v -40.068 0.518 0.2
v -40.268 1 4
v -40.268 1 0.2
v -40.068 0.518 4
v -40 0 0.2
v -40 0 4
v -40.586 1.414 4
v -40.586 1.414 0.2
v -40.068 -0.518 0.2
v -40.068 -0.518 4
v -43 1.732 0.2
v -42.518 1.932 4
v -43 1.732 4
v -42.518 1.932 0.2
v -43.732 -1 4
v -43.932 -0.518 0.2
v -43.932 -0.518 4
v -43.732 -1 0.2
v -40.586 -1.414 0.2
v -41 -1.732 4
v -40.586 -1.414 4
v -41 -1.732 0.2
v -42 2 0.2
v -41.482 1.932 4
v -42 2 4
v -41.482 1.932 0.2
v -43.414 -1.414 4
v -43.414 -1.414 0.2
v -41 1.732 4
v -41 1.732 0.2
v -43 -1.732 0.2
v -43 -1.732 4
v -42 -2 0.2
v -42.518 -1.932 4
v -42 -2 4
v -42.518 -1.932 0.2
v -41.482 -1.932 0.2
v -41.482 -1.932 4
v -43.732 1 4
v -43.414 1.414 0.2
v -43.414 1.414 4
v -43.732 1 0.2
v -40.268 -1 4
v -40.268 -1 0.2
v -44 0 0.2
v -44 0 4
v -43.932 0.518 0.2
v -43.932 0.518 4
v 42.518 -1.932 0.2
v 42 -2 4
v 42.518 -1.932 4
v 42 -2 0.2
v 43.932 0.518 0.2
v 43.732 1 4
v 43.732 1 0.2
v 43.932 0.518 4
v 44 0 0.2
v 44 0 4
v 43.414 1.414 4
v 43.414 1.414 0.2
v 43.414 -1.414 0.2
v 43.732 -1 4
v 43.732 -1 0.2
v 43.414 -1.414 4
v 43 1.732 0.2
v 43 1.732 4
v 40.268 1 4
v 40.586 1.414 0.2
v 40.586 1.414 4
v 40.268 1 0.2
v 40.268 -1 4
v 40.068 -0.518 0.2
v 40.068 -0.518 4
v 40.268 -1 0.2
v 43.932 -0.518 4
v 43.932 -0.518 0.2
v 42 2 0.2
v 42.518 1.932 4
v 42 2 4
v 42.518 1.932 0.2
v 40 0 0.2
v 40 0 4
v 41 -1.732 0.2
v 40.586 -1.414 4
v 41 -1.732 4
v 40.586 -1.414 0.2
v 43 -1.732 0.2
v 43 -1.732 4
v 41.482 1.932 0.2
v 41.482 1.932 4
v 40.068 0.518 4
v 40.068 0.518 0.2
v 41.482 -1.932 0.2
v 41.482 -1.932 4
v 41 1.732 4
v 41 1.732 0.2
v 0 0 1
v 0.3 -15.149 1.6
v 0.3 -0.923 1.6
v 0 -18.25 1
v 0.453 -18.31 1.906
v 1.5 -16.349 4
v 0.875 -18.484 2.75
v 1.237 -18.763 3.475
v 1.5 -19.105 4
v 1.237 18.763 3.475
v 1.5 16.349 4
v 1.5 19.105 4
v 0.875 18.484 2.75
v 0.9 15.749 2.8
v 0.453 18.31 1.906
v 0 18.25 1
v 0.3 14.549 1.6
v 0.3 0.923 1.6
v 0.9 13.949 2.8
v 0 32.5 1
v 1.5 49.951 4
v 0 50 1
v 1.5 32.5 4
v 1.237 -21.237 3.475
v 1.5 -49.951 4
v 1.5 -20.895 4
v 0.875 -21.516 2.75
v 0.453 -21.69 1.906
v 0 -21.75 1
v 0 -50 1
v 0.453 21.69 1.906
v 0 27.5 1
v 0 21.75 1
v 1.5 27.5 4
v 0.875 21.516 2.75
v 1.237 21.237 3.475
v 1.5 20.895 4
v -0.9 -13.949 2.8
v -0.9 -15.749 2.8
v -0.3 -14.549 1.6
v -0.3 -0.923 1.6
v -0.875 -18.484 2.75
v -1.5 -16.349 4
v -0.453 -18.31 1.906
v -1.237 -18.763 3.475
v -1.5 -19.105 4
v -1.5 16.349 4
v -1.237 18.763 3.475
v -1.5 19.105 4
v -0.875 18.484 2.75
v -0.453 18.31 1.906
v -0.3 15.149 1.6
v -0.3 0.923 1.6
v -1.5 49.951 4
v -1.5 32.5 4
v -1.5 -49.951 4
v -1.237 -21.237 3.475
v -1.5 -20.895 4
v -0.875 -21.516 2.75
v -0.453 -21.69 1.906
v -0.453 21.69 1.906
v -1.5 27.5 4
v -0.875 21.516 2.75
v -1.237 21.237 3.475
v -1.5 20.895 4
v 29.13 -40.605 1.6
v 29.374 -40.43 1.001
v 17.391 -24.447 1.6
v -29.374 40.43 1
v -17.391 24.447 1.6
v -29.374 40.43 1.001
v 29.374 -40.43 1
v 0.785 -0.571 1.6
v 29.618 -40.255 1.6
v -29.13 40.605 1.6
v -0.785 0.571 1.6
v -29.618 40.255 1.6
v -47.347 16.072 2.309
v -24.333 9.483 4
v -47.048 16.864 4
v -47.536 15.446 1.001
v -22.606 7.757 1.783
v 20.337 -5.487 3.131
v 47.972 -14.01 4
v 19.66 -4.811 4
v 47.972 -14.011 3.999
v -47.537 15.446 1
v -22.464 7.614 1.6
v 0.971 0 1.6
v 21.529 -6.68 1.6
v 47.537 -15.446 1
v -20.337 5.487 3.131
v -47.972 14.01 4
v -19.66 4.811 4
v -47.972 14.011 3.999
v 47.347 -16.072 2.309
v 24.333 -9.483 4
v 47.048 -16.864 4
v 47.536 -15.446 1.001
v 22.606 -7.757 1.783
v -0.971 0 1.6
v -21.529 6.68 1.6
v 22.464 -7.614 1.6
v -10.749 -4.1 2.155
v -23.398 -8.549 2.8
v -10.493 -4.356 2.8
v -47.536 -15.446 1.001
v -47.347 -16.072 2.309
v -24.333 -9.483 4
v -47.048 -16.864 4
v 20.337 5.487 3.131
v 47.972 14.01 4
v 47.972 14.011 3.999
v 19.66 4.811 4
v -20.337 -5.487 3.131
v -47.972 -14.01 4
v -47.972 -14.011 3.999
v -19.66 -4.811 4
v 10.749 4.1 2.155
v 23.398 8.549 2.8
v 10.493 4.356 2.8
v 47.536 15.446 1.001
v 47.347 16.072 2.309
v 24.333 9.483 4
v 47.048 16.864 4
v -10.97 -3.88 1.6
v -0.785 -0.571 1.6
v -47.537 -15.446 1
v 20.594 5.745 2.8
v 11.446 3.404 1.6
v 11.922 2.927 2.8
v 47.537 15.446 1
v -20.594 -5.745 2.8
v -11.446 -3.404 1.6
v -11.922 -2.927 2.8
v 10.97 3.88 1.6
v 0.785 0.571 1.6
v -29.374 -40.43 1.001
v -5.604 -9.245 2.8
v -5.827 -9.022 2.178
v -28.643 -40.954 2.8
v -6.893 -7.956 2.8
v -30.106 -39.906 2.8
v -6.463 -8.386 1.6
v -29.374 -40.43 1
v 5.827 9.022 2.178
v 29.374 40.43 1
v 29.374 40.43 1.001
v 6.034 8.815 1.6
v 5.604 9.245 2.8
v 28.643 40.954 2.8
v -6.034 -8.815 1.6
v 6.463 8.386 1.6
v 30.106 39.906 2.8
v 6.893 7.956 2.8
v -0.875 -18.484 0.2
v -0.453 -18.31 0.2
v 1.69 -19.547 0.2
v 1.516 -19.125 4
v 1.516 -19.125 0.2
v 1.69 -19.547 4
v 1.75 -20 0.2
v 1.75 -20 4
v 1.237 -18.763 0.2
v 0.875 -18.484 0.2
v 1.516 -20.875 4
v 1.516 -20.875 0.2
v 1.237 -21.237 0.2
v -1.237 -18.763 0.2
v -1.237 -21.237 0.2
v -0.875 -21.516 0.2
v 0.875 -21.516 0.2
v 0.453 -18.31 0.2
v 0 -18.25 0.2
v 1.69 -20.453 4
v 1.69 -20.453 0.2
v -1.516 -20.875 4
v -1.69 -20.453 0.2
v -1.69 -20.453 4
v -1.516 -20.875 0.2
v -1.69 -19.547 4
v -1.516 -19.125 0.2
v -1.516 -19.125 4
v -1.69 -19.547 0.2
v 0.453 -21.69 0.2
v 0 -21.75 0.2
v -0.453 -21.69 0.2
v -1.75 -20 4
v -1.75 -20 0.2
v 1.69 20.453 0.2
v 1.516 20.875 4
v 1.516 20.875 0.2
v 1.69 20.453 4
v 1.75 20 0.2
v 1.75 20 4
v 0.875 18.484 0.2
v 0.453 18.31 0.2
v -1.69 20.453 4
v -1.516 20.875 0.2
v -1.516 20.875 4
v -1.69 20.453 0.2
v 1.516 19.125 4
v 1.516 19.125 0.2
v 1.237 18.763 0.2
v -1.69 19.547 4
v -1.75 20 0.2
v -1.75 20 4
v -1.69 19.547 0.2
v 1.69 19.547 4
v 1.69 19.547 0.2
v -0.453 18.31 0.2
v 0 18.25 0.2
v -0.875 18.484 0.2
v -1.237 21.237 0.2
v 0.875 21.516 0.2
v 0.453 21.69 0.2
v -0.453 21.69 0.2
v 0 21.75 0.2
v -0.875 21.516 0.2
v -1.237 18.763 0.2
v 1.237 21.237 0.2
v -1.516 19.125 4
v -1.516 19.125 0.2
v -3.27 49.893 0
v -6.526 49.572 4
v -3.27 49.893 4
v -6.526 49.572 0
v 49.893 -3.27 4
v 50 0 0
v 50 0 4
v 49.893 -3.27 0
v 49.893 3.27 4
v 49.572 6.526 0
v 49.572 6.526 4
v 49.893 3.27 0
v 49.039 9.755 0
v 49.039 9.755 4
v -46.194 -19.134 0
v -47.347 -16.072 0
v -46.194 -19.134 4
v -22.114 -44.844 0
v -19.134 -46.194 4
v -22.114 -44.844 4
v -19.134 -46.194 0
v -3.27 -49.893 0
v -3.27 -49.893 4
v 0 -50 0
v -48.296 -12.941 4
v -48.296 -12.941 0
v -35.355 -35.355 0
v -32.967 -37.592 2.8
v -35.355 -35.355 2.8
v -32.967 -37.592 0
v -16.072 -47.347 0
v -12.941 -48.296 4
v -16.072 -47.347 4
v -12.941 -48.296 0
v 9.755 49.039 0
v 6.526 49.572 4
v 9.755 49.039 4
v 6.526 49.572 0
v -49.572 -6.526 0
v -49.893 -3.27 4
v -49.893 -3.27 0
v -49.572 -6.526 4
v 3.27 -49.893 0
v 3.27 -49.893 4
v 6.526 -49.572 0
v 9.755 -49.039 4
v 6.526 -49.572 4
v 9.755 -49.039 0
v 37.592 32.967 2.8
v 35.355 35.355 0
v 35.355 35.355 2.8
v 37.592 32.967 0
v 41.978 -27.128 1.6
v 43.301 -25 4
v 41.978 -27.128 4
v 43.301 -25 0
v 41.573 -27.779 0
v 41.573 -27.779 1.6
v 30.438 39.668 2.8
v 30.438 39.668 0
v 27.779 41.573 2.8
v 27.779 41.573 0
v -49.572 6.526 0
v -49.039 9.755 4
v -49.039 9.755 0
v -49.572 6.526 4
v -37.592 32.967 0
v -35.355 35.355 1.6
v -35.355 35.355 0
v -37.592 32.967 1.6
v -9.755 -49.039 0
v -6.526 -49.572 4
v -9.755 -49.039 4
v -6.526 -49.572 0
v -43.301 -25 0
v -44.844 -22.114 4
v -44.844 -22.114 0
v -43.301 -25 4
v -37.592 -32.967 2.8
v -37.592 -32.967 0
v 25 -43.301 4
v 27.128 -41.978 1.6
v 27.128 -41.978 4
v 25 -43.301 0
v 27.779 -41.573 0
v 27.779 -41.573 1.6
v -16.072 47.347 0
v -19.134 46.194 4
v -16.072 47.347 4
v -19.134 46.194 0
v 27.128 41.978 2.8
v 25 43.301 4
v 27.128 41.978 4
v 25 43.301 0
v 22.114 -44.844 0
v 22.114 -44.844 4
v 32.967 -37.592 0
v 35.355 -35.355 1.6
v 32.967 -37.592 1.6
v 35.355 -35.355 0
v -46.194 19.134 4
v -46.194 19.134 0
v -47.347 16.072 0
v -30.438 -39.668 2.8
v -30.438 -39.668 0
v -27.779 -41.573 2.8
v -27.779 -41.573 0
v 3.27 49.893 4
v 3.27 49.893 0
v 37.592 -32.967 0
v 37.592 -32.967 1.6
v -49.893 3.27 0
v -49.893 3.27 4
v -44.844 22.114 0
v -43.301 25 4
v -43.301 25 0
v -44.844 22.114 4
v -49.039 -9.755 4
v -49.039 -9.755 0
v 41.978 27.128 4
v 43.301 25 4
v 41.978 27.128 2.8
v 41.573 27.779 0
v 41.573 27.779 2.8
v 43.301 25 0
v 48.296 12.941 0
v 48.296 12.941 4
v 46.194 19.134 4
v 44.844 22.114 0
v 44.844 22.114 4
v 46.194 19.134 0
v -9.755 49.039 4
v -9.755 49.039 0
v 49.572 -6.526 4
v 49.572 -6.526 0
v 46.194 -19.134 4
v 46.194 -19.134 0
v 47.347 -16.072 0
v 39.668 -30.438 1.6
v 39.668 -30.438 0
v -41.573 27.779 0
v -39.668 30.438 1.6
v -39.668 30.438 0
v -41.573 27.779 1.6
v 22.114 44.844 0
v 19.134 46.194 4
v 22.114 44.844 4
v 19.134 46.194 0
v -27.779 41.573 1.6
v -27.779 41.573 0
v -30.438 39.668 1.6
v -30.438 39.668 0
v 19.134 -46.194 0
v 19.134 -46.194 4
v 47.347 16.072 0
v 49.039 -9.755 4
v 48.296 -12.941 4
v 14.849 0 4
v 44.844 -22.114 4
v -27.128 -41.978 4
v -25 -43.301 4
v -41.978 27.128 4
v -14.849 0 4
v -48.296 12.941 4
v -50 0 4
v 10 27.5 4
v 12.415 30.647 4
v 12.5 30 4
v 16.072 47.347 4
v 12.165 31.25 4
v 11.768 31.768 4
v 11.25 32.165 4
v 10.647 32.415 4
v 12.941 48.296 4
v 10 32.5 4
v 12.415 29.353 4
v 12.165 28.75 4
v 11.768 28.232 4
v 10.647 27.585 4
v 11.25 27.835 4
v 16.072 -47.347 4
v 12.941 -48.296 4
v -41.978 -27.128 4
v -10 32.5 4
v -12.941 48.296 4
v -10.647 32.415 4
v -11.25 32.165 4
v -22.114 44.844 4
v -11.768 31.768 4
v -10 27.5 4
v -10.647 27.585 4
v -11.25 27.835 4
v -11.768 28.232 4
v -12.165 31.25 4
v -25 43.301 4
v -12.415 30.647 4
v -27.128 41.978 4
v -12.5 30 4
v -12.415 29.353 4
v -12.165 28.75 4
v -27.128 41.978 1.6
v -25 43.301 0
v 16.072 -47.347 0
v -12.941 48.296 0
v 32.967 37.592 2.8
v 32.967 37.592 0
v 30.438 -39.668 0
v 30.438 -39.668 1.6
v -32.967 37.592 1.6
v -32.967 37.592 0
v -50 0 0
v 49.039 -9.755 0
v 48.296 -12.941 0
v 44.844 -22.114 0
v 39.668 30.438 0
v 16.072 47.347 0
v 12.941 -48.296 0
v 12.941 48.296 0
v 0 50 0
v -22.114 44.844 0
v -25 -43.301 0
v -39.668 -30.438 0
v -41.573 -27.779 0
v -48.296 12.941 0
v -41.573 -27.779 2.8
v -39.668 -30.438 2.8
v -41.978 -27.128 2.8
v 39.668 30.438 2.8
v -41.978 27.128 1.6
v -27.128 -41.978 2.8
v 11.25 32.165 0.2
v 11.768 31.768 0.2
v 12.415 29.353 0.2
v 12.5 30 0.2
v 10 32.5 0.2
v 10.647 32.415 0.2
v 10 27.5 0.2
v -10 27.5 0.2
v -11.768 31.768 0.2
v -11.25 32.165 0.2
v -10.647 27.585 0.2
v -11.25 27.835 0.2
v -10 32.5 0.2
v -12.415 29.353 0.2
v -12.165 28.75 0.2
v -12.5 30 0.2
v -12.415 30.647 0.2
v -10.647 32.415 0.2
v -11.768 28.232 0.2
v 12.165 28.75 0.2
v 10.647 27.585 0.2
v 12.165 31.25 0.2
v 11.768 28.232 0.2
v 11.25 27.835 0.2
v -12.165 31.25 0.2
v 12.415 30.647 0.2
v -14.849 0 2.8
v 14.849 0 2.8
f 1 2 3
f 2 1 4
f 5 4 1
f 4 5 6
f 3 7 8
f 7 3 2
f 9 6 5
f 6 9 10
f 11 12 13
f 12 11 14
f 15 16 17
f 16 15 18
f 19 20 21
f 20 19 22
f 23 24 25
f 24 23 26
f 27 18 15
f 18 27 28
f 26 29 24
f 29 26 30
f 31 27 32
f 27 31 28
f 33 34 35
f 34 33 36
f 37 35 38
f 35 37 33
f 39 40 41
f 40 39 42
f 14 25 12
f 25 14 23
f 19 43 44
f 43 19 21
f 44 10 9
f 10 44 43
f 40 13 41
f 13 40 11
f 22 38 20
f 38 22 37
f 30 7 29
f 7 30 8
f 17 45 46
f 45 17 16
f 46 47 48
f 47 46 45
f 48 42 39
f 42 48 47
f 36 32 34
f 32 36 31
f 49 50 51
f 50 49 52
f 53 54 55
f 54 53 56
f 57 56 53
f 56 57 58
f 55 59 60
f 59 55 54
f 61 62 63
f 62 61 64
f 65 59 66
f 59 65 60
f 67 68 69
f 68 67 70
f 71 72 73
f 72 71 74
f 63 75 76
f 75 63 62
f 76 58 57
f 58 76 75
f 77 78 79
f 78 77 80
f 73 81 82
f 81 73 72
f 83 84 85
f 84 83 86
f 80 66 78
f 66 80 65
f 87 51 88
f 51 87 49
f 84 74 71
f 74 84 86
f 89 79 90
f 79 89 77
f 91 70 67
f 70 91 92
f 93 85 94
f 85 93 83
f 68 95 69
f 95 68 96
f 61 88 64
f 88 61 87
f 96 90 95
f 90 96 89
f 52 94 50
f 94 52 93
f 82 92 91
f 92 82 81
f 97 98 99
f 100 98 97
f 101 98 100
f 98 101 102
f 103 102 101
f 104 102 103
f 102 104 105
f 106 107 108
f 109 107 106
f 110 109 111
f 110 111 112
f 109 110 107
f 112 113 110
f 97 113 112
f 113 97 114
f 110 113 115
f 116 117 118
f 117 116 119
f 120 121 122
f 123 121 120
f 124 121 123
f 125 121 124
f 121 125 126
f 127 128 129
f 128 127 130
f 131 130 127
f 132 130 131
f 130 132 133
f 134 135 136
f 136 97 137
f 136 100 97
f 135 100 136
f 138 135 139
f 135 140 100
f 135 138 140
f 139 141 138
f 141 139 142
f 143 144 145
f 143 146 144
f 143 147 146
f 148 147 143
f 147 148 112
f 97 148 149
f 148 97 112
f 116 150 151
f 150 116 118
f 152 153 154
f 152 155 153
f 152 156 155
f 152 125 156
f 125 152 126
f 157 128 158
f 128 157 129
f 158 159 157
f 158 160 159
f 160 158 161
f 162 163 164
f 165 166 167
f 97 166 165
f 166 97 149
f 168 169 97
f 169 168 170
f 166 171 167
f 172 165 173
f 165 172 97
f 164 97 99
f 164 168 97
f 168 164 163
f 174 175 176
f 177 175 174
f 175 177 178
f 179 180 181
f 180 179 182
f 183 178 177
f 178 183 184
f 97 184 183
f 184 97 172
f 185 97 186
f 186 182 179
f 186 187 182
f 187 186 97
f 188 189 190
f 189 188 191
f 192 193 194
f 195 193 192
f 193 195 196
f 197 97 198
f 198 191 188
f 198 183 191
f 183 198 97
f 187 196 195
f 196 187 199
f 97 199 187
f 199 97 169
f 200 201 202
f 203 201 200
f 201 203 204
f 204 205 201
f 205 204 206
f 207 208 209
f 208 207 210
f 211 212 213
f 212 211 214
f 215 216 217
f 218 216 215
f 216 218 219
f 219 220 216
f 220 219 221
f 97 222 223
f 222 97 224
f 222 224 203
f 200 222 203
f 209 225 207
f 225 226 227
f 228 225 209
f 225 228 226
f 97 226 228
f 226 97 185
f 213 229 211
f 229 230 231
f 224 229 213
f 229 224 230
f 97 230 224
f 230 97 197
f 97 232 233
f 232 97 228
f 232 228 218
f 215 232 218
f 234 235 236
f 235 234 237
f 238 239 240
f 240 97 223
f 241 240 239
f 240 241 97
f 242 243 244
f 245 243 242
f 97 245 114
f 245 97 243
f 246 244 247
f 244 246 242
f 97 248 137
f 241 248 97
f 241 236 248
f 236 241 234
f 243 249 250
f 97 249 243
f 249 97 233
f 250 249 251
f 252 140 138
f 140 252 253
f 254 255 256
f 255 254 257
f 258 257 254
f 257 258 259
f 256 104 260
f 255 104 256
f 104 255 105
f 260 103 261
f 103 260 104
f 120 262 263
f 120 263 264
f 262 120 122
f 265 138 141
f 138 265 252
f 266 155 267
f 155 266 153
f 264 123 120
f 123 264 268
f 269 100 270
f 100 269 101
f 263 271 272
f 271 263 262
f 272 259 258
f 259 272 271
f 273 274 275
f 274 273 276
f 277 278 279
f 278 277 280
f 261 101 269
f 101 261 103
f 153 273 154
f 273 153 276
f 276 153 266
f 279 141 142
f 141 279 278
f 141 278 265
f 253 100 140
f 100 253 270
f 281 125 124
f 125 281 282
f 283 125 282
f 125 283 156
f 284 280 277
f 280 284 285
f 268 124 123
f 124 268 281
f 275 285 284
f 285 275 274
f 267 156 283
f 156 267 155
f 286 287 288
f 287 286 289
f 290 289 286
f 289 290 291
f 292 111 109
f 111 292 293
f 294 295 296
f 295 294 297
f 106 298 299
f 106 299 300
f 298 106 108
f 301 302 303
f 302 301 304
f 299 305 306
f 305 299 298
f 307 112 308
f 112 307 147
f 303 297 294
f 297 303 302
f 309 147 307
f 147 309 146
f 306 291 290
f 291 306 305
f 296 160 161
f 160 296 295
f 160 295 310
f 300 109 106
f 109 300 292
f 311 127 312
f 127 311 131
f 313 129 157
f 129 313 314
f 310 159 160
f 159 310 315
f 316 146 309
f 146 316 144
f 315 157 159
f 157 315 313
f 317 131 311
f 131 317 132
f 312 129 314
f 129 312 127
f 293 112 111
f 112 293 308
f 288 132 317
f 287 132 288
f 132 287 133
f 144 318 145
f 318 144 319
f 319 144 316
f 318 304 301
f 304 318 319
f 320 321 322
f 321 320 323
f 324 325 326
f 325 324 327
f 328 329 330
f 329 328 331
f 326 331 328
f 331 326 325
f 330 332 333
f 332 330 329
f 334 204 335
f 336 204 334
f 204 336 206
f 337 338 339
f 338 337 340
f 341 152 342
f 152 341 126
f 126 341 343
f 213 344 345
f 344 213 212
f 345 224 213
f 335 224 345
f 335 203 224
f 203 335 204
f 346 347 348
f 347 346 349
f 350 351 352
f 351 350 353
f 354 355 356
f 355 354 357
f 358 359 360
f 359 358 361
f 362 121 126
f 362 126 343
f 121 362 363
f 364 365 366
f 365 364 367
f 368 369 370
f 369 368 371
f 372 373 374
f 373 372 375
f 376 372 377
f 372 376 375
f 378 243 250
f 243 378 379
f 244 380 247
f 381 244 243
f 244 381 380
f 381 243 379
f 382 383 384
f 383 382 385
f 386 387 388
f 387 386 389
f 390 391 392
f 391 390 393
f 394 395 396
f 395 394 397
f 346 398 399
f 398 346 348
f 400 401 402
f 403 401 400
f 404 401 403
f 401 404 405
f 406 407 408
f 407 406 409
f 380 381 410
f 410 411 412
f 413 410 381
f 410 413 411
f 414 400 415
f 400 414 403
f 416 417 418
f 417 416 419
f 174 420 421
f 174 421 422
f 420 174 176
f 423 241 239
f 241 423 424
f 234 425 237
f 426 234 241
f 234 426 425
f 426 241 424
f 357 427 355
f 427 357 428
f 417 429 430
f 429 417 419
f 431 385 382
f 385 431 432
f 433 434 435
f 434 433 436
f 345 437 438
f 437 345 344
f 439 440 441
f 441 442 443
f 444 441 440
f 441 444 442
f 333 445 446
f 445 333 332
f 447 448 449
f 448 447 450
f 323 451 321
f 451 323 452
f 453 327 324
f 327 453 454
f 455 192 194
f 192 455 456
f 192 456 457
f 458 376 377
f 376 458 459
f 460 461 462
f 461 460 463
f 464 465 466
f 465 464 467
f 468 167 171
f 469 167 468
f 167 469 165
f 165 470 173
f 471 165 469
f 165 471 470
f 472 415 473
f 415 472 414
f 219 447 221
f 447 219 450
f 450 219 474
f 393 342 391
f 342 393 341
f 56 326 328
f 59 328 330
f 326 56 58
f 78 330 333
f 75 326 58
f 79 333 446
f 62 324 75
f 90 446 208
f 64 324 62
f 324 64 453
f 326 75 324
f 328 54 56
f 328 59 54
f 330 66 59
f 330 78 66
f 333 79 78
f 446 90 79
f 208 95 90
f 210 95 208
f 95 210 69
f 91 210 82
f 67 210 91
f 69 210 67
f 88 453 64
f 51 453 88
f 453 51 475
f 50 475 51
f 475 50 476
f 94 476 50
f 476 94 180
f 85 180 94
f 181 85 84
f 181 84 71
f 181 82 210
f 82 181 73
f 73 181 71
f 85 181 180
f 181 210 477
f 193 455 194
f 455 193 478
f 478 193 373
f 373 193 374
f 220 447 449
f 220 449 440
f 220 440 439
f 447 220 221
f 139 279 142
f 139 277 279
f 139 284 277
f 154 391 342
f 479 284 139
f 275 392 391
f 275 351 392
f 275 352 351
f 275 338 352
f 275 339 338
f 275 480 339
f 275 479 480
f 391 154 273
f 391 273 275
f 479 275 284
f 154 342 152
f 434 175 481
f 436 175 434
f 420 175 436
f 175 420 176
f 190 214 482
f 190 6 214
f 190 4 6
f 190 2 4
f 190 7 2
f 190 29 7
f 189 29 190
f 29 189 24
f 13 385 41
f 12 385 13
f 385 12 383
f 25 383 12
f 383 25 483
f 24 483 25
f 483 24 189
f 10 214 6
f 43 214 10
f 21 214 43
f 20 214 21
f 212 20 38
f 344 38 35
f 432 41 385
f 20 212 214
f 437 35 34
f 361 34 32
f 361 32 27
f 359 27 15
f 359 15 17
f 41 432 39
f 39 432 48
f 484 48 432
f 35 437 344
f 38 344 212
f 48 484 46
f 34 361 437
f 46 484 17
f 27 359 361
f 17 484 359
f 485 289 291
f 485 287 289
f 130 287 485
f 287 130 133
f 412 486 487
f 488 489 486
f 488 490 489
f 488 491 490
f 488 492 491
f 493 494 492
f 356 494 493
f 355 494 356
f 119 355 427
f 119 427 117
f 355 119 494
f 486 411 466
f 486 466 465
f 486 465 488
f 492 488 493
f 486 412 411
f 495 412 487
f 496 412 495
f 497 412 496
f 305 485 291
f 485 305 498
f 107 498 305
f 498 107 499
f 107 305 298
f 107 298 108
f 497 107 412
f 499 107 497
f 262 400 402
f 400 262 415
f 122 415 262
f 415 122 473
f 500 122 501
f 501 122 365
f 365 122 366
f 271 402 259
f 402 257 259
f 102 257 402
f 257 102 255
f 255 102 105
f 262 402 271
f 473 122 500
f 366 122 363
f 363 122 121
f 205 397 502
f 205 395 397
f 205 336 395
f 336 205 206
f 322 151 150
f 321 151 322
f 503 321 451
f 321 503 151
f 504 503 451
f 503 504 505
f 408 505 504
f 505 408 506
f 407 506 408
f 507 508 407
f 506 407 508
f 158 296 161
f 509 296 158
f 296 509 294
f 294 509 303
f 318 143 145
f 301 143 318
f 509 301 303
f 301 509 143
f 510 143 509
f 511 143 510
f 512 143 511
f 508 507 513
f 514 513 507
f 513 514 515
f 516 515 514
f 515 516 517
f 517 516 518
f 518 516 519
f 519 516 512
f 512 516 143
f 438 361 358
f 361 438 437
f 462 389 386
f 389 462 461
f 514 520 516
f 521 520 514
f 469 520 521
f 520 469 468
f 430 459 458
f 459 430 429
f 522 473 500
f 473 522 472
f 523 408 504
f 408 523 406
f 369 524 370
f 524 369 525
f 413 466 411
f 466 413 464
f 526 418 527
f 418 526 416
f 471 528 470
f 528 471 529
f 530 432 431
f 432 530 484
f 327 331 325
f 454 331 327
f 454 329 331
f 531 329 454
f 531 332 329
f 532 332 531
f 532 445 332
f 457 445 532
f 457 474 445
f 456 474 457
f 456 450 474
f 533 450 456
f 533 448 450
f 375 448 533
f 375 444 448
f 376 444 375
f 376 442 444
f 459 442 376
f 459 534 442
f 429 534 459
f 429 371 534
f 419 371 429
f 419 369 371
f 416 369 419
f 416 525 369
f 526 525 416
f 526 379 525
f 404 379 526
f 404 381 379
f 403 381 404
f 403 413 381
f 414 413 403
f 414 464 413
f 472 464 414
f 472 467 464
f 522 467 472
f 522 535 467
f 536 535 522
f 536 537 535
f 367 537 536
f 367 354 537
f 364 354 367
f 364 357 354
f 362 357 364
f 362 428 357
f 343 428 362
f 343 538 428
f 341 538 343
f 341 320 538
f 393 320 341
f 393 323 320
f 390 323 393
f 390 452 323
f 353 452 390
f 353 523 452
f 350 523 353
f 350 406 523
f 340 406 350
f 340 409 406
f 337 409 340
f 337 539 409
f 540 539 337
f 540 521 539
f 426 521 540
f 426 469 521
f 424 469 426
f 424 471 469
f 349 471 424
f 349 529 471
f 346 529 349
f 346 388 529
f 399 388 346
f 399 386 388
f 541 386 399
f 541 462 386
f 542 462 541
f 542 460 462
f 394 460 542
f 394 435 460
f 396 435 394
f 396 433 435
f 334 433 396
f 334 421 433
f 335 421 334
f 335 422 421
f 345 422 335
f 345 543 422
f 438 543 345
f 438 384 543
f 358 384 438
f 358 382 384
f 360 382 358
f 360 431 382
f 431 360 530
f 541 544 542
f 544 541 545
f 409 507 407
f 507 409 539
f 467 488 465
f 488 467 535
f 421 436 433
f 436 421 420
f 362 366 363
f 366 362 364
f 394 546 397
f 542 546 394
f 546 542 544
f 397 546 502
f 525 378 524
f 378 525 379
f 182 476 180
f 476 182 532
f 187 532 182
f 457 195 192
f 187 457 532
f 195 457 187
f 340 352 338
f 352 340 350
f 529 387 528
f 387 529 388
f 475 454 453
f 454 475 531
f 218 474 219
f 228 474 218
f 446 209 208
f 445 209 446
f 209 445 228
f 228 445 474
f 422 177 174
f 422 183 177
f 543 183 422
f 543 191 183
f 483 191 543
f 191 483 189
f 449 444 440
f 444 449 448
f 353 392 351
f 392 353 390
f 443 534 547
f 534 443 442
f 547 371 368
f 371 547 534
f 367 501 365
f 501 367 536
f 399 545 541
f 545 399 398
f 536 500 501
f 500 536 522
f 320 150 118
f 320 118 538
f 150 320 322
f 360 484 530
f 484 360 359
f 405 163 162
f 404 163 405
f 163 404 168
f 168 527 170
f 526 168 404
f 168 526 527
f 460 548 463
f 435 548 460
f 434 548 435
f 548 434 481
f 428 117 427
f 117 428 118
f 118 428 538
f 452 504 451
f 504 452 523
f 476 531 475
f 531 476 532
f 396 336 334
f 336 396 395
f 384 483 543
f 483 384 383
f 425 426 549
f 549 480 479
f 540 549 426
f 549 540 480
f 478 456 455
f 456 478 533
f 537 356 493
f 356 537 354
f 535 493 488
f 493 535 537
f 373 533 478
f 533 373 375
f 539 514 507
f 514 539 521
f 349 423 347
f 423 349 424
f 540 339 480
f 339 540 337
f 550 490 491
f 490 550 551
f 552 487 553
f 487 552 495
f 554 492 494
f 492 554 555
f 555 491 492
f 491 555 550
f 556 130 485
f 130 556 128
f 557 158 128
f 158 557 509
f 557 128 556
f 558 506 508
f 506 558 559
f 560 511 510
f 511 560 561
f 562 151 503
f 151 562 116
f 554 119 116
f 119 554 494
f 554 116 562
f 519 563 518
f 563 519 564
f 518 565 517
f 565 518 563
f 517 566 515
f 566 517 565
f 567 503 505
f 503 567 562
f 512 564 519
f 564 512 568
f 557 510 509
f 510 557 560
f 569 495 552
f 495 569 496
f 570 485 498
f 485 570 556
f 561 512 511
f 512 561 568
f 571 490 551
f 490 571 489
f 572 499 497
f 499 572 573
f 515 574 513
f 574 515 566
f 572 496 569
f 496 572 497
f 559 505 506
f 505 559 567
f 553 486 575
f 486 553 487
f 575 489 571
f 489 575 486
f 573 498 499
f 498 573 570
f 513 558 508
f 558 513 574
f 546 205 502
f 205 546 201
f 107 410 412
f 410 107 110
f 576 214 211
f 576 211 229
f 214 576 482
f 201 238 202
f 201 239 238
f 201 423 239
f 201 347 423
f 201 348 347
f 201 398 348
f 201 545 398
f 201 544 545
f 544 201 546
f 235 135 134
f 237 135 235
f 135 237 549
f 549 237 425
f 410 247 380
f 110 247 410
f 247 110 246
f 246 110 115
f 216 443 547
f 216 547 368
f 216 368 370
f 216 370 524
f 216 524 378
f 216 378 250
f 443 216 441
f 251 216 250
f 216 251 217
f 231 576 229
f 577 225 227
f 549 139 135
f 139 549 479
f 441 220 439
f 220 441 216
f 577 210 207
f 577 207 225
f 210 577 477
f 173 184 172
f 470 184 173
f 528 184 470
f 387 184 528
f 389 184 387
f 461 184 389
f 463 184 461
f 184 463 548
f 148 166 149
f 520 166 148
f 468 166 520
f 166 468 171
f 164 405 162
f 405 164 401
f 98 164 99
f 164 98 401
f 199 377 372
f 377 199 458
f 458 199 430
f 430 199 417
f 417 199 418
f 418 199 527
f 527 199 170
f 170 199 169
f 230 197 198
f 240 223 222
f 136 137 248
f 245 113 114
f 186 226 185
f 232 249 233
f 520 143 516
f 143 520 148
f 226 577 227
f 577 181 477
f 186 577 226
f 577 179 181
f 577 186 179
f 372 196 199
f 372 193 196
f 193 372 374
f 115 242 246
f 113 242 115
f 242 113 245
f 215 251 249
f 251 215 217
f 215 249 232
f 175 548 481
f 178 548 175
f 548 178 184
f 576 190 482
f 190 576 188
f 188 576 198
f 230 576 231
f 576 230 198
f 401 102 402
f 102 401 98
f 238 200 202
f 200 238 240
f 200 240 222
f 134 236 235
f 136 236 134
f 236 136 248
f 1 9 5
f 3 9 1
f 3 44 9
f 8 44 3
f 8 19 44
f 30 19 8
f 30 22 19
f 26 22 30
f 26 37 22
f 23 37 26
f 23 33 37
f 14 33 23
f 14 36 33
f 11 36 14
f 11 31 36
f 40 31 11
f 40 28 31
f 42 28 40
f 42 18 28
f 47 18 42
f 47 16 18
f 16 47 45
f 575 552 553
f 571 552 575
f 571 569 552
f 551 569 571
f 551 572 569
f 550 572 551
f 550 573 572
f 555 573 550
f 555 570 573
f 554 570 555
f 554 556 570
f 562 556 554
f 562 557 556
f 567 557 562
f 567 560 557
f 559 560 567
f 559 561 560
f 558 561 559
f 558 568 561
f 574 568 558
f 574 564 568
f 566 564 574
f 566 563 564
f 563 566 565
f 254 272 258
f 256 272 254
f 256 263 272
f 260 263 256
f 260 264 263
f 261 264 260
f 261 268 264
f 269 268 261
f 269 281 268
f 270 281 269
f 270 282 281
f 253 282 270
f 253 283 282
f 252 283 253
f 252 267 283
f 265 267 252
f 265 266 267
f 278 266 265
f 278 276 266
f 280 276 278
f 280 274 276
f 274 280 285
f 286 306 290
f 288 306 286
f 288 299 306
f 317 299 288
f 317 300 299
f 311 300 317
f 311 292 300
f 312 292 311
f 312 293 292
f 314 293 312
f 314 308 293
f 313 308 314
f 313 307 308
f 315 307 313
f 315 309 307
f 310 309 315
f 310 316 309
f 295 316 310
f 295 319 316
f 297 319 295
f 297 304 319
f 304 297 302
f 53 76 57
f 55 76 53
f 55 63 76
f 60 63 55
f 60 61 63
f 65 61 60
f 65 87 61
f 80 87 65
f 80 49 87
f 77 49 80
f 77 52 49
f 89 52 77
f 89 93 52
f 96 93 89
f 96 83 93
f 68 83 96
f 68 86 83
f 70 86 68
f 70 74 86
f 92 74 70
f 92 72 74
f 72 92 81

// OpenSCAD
// file: ../OpenSCAD_Modules/cube_vround.scad
module cube_vround(
	size=[10,10,10],
	round_corners=[true,true,true,true],
	rounding=3,
	center_xy=false,
	center_z=false,
	attach=0,
	wall_attach=0,
	quality=2, //integer from 1 to infinity
)
{
	assert(len(size)==3);
	assert(len(round_corners)==4);
	assert(rounding>0);
	assert(rounding<=size[0]/2);
	assert(rounding<=size[1]/2);
	assert(quality>0);
	assert(attach>=0);
	assert(wall_attach>=0);
	height=size[2]+attach;
	cyl_r=rounding+wall_attach;
	cyl_mvx=size[0]/2-rounding;
	cyl_mvy=size[1]/2-rounding;
	cube_szx=size[0]/2;
	cube_szy=size[1]/2;
	cube_mvx=cube_szx/2+wall_attach;
	cube_mvy=cube_szy/2+wall_attach;
	translate([center_xy?0:cube_szx,center_xy?0:cube_szy,center_z?-attach/2:(size[2]-attach)/2])
		hull()
		{
			if(round_corners[0])
				translate([cyl_mvx,cyl_mvy])
					cylinder(r=cyl_r,h=height,$fn=12*quality,center=true);
			else
				translate([cube_mvx,cube_mvy])
					cube([cube_szx,cube_szy,height],center=true);
			if(round_corners[1])
				translate([cyl_mvx,-cyl_mvy])
					cylinder(r=cyl_r,h=height,$fn=12*quality,center=true);
			else
				translate([cube_mvx,-cube_mvy])
					cube([cube_szx,cube_szy,height],center=true);
			if(round_corners[2])
				translate([-cyl_mvx,-cyl_mvy])
					cylinder(r=cyl_r,h=height,$fn=12*quality,center=true);
			else
				translate([-cube_mvx,-cube_mvy])
					cube([cube_szx,cube_szy,height],center=true);
			if(round_corners[3])
				translate([-cyl_mvx,cyl_mvy])
					cylinder(r=cyl_r,h=height,$fn=12*quality,center=true);
			else
				translate([-cube_mvx,cube_mvy])
					cube([cube_szx,cube_szy,height],center=true);
		};
}

//example
cube_vround(round_corners=[true,false,true,false],
size=[10,20,6],
attach=0.1,
wall_attach=0.1,
rounding=3,
center_xy=true,center_z=false);
// main file
use <../OpenSCAD_Modules/cube_vround.scad>

module HNut
(
	nutDiam=6.75,
	nutHeight=3,
)
{
	cylinder(d=nutDiam,h=nutHeight,center=false,$fn=6);
}

module Plate
(
	ext_diameter=100,
	base_height=4,
	pwr_wires_cut_size=[20,5,30],
	metal_bar_size=[21,1.2],
	metal_bar_clips=[5,5,85],
	clip_wires_cut_diam=4,
	stiffener_rays_count=5,
	stiffener_rays_size=[3,3,90],
	screw_diam=3.5,
	screw_diff=40,
	quality=2,
	stub_layer_size=0.2,
)
{
	cutClr=1;
	union()
	{
		difference()
		{
			//base
			cylinder(h=base_height,d=ext_diameter,center=false,$fn=48*quality);
			//wires_cut
			hull()
			{
				translate([-pwr_wires_cut_size[0]/2,pwr_wires_cut_size[2],-cutClr])
				cylinder(h=base_height+2*cutClr,d=pwr_wires_cut_size[1],center=false,$fn=12*quality);
				translate([pwr_wires_cut_size[0]/2,pwr_wires_cut_size[2],-cutClr])
				cylinder(h=base_height+2*cutClr,d=pwr_wires_cut_size[1],center=false,$fn=12*quality);
			}
			
			rotate(a=45, v=[0,0,1])
			translate([0,0,(metal_bar_size[1]+cutClr)/2+base_height-metal_bar_size[1]])
			{
				//metal bar top cut
				cube(size=[ext_diameter*2,metal_bar_size[0],metal_bar_size[1]+cutClr],center=true);
			}

			rotate(a=-45, v=[0,0,1])
			translate([0,0,(metal_bar_size[1]*2+cutClr)/2+base_height-metal_bar_size[1]*2])
			{
				//metal bar top cut
				cube(size=[ext_diameter*2,metal_bar_size[0],metal_bar_size[1]*2+cutClr],center=true);
			}

			//metal bar clip wires
			for(i=[-1,1])
			{
				translate([i*(metal_bar_clips[2]/2-metal_bar_clips[0]/2+clip_wires_cut_diam/2),0,-cutClr])
				cylinder(h=base_height+2*cutClr,d=clip_wires_cut_diam,center=false,$fn=12*quality);
			}
			//stiffener rays
			for(i=[0:1:stiffener_rays_count-1])
			{
				rotate(a=i*(180/stiffener_rays_count),v=[0,0,1])
				rotate(a=90,v=[1,0,0])
				linear_extrude(h=stiffener_rays_size[2],center=true)
				polygon(points=[
					[0,-stiffener_rays_size[1]+base_height],
					[-stiffener_rays_size[0]/2,base_height],
					[-stiffener_rays_size[0]/2,cutClr+base_height],
					[stiffener_rays_size[0]/2,cutClr+base_height],
					[stiffener_rays_size[0]/2,base_height],
				]);
			}
			//screw holes
			for(i=[-1,1])
			{
				translate([0,i*(screw_diff/2),-cutClr])
				cylinder(h=base_height+2*cutClr,d=screw_diam,center=false,$fn=12*quality);
			}
		}

		//stub layer
		cylinder(h=stub_layer_size,d=ext_diameter,center=false,$fn=48*quality);
	}
}

module TopClip
(
	ext_diameter=50,
	base_height=4,
	screw_diam=3.5,
	screw_diff=40,
	quality=2,
	stub_layer_size=0.2,
)
{
	cutClr=1;
	union()
	{
		difference()
		{
			//base
			cylinder(h=base_height,d=ext_diameter,center=false,$fn=48*quality);
			//screw holes
			for(i=[-1,1])
			{
				translate([0,i*(screw_diff/2),-cutClr])
				cylinder(h=base_height+2*cutClr,d=screw_diam,center=false,$fn=12*quality);
			}
		}
		//stub layer
		cylinder(h=stub_layer_size,d=ext_diameter,center=false,$fn=48*quality);
	}
}

module BackPlate
(
	backplate_size=[85,45],
	center_cut_size=[18,2],
	rounding=2,
	base_height=5,
	screw_diam=3.5,
	screw_diff=40,
	nut_height=2,
	side_screw_diam=3,
	side_screw_pos=[80,3],
	quality=2,
	stub_layer_size=0.2,
)
{
	cutClr=1;
	union()
	{
		difference()
		{
			//base
			cube_vround(size=[backplate_size[0],backplate_size[1],base_height],rounding=rounding,center_xy=true);
			//screw holes
			for(i=[-1,1])
			{
				translate([0,i*(screw_diff/2),-cutClr])
				cylinder(h=base_height+2*cutClr,d=screw_diam,center=false,$fn=12*quality);
				
				translate([0,i*(screw_diff/2),base_height-nut_height])
				HNut(nutHeight=base_height);
			}
			//center cut
			translate([-backplate_size[0],-center_cut_size[0]/2,base_height-center_cut_size[1]])
			cube(size=[backplate_size[0]*2,center_cut_size[0],base_height]);
			//side cuts
			for(i=[-1,1])
			{
				translate([i*(side_screw_pos[0]/2-side_screw_diam/2),0,side_screw_pos[1]])
				rotate(a=90,v=[1,0,0])
				cylinder(h=backplate_size[1]+2*cutClr,d=side_screw_diam,center=true,$fn=12*quality);

				translate([i*(backplate_size[0]/2),0,-cutClr])
				cube_vround(size=[(backplate_size[0]-side_screw_pos[0]),center_cut_size[0],base_height+2*cutClr],rounding=rounding,center_xy=true);
			}
		}
		//stub layer
		cube_vround(size=[backplate_size[0],backplate_size[1],stub_layer_size],rounding=rounding,center_xy=true);
	}
}

if($preview)
{
	Plate(stub_layer_size=0);

	translate([0,0,4])
	color([0.75, 1, 0.75, 0.5])
	render()
	TopClip(stub_layer_size=0);

	rotate(a=180,v=[1,0,0])
	color([1, 0.75, 0.75, 0.5])
	render()
	BackPlate(stub_layer_size=0);
}
else
{
	Plate();
	//TopClip();
	//BackPlate();
}
